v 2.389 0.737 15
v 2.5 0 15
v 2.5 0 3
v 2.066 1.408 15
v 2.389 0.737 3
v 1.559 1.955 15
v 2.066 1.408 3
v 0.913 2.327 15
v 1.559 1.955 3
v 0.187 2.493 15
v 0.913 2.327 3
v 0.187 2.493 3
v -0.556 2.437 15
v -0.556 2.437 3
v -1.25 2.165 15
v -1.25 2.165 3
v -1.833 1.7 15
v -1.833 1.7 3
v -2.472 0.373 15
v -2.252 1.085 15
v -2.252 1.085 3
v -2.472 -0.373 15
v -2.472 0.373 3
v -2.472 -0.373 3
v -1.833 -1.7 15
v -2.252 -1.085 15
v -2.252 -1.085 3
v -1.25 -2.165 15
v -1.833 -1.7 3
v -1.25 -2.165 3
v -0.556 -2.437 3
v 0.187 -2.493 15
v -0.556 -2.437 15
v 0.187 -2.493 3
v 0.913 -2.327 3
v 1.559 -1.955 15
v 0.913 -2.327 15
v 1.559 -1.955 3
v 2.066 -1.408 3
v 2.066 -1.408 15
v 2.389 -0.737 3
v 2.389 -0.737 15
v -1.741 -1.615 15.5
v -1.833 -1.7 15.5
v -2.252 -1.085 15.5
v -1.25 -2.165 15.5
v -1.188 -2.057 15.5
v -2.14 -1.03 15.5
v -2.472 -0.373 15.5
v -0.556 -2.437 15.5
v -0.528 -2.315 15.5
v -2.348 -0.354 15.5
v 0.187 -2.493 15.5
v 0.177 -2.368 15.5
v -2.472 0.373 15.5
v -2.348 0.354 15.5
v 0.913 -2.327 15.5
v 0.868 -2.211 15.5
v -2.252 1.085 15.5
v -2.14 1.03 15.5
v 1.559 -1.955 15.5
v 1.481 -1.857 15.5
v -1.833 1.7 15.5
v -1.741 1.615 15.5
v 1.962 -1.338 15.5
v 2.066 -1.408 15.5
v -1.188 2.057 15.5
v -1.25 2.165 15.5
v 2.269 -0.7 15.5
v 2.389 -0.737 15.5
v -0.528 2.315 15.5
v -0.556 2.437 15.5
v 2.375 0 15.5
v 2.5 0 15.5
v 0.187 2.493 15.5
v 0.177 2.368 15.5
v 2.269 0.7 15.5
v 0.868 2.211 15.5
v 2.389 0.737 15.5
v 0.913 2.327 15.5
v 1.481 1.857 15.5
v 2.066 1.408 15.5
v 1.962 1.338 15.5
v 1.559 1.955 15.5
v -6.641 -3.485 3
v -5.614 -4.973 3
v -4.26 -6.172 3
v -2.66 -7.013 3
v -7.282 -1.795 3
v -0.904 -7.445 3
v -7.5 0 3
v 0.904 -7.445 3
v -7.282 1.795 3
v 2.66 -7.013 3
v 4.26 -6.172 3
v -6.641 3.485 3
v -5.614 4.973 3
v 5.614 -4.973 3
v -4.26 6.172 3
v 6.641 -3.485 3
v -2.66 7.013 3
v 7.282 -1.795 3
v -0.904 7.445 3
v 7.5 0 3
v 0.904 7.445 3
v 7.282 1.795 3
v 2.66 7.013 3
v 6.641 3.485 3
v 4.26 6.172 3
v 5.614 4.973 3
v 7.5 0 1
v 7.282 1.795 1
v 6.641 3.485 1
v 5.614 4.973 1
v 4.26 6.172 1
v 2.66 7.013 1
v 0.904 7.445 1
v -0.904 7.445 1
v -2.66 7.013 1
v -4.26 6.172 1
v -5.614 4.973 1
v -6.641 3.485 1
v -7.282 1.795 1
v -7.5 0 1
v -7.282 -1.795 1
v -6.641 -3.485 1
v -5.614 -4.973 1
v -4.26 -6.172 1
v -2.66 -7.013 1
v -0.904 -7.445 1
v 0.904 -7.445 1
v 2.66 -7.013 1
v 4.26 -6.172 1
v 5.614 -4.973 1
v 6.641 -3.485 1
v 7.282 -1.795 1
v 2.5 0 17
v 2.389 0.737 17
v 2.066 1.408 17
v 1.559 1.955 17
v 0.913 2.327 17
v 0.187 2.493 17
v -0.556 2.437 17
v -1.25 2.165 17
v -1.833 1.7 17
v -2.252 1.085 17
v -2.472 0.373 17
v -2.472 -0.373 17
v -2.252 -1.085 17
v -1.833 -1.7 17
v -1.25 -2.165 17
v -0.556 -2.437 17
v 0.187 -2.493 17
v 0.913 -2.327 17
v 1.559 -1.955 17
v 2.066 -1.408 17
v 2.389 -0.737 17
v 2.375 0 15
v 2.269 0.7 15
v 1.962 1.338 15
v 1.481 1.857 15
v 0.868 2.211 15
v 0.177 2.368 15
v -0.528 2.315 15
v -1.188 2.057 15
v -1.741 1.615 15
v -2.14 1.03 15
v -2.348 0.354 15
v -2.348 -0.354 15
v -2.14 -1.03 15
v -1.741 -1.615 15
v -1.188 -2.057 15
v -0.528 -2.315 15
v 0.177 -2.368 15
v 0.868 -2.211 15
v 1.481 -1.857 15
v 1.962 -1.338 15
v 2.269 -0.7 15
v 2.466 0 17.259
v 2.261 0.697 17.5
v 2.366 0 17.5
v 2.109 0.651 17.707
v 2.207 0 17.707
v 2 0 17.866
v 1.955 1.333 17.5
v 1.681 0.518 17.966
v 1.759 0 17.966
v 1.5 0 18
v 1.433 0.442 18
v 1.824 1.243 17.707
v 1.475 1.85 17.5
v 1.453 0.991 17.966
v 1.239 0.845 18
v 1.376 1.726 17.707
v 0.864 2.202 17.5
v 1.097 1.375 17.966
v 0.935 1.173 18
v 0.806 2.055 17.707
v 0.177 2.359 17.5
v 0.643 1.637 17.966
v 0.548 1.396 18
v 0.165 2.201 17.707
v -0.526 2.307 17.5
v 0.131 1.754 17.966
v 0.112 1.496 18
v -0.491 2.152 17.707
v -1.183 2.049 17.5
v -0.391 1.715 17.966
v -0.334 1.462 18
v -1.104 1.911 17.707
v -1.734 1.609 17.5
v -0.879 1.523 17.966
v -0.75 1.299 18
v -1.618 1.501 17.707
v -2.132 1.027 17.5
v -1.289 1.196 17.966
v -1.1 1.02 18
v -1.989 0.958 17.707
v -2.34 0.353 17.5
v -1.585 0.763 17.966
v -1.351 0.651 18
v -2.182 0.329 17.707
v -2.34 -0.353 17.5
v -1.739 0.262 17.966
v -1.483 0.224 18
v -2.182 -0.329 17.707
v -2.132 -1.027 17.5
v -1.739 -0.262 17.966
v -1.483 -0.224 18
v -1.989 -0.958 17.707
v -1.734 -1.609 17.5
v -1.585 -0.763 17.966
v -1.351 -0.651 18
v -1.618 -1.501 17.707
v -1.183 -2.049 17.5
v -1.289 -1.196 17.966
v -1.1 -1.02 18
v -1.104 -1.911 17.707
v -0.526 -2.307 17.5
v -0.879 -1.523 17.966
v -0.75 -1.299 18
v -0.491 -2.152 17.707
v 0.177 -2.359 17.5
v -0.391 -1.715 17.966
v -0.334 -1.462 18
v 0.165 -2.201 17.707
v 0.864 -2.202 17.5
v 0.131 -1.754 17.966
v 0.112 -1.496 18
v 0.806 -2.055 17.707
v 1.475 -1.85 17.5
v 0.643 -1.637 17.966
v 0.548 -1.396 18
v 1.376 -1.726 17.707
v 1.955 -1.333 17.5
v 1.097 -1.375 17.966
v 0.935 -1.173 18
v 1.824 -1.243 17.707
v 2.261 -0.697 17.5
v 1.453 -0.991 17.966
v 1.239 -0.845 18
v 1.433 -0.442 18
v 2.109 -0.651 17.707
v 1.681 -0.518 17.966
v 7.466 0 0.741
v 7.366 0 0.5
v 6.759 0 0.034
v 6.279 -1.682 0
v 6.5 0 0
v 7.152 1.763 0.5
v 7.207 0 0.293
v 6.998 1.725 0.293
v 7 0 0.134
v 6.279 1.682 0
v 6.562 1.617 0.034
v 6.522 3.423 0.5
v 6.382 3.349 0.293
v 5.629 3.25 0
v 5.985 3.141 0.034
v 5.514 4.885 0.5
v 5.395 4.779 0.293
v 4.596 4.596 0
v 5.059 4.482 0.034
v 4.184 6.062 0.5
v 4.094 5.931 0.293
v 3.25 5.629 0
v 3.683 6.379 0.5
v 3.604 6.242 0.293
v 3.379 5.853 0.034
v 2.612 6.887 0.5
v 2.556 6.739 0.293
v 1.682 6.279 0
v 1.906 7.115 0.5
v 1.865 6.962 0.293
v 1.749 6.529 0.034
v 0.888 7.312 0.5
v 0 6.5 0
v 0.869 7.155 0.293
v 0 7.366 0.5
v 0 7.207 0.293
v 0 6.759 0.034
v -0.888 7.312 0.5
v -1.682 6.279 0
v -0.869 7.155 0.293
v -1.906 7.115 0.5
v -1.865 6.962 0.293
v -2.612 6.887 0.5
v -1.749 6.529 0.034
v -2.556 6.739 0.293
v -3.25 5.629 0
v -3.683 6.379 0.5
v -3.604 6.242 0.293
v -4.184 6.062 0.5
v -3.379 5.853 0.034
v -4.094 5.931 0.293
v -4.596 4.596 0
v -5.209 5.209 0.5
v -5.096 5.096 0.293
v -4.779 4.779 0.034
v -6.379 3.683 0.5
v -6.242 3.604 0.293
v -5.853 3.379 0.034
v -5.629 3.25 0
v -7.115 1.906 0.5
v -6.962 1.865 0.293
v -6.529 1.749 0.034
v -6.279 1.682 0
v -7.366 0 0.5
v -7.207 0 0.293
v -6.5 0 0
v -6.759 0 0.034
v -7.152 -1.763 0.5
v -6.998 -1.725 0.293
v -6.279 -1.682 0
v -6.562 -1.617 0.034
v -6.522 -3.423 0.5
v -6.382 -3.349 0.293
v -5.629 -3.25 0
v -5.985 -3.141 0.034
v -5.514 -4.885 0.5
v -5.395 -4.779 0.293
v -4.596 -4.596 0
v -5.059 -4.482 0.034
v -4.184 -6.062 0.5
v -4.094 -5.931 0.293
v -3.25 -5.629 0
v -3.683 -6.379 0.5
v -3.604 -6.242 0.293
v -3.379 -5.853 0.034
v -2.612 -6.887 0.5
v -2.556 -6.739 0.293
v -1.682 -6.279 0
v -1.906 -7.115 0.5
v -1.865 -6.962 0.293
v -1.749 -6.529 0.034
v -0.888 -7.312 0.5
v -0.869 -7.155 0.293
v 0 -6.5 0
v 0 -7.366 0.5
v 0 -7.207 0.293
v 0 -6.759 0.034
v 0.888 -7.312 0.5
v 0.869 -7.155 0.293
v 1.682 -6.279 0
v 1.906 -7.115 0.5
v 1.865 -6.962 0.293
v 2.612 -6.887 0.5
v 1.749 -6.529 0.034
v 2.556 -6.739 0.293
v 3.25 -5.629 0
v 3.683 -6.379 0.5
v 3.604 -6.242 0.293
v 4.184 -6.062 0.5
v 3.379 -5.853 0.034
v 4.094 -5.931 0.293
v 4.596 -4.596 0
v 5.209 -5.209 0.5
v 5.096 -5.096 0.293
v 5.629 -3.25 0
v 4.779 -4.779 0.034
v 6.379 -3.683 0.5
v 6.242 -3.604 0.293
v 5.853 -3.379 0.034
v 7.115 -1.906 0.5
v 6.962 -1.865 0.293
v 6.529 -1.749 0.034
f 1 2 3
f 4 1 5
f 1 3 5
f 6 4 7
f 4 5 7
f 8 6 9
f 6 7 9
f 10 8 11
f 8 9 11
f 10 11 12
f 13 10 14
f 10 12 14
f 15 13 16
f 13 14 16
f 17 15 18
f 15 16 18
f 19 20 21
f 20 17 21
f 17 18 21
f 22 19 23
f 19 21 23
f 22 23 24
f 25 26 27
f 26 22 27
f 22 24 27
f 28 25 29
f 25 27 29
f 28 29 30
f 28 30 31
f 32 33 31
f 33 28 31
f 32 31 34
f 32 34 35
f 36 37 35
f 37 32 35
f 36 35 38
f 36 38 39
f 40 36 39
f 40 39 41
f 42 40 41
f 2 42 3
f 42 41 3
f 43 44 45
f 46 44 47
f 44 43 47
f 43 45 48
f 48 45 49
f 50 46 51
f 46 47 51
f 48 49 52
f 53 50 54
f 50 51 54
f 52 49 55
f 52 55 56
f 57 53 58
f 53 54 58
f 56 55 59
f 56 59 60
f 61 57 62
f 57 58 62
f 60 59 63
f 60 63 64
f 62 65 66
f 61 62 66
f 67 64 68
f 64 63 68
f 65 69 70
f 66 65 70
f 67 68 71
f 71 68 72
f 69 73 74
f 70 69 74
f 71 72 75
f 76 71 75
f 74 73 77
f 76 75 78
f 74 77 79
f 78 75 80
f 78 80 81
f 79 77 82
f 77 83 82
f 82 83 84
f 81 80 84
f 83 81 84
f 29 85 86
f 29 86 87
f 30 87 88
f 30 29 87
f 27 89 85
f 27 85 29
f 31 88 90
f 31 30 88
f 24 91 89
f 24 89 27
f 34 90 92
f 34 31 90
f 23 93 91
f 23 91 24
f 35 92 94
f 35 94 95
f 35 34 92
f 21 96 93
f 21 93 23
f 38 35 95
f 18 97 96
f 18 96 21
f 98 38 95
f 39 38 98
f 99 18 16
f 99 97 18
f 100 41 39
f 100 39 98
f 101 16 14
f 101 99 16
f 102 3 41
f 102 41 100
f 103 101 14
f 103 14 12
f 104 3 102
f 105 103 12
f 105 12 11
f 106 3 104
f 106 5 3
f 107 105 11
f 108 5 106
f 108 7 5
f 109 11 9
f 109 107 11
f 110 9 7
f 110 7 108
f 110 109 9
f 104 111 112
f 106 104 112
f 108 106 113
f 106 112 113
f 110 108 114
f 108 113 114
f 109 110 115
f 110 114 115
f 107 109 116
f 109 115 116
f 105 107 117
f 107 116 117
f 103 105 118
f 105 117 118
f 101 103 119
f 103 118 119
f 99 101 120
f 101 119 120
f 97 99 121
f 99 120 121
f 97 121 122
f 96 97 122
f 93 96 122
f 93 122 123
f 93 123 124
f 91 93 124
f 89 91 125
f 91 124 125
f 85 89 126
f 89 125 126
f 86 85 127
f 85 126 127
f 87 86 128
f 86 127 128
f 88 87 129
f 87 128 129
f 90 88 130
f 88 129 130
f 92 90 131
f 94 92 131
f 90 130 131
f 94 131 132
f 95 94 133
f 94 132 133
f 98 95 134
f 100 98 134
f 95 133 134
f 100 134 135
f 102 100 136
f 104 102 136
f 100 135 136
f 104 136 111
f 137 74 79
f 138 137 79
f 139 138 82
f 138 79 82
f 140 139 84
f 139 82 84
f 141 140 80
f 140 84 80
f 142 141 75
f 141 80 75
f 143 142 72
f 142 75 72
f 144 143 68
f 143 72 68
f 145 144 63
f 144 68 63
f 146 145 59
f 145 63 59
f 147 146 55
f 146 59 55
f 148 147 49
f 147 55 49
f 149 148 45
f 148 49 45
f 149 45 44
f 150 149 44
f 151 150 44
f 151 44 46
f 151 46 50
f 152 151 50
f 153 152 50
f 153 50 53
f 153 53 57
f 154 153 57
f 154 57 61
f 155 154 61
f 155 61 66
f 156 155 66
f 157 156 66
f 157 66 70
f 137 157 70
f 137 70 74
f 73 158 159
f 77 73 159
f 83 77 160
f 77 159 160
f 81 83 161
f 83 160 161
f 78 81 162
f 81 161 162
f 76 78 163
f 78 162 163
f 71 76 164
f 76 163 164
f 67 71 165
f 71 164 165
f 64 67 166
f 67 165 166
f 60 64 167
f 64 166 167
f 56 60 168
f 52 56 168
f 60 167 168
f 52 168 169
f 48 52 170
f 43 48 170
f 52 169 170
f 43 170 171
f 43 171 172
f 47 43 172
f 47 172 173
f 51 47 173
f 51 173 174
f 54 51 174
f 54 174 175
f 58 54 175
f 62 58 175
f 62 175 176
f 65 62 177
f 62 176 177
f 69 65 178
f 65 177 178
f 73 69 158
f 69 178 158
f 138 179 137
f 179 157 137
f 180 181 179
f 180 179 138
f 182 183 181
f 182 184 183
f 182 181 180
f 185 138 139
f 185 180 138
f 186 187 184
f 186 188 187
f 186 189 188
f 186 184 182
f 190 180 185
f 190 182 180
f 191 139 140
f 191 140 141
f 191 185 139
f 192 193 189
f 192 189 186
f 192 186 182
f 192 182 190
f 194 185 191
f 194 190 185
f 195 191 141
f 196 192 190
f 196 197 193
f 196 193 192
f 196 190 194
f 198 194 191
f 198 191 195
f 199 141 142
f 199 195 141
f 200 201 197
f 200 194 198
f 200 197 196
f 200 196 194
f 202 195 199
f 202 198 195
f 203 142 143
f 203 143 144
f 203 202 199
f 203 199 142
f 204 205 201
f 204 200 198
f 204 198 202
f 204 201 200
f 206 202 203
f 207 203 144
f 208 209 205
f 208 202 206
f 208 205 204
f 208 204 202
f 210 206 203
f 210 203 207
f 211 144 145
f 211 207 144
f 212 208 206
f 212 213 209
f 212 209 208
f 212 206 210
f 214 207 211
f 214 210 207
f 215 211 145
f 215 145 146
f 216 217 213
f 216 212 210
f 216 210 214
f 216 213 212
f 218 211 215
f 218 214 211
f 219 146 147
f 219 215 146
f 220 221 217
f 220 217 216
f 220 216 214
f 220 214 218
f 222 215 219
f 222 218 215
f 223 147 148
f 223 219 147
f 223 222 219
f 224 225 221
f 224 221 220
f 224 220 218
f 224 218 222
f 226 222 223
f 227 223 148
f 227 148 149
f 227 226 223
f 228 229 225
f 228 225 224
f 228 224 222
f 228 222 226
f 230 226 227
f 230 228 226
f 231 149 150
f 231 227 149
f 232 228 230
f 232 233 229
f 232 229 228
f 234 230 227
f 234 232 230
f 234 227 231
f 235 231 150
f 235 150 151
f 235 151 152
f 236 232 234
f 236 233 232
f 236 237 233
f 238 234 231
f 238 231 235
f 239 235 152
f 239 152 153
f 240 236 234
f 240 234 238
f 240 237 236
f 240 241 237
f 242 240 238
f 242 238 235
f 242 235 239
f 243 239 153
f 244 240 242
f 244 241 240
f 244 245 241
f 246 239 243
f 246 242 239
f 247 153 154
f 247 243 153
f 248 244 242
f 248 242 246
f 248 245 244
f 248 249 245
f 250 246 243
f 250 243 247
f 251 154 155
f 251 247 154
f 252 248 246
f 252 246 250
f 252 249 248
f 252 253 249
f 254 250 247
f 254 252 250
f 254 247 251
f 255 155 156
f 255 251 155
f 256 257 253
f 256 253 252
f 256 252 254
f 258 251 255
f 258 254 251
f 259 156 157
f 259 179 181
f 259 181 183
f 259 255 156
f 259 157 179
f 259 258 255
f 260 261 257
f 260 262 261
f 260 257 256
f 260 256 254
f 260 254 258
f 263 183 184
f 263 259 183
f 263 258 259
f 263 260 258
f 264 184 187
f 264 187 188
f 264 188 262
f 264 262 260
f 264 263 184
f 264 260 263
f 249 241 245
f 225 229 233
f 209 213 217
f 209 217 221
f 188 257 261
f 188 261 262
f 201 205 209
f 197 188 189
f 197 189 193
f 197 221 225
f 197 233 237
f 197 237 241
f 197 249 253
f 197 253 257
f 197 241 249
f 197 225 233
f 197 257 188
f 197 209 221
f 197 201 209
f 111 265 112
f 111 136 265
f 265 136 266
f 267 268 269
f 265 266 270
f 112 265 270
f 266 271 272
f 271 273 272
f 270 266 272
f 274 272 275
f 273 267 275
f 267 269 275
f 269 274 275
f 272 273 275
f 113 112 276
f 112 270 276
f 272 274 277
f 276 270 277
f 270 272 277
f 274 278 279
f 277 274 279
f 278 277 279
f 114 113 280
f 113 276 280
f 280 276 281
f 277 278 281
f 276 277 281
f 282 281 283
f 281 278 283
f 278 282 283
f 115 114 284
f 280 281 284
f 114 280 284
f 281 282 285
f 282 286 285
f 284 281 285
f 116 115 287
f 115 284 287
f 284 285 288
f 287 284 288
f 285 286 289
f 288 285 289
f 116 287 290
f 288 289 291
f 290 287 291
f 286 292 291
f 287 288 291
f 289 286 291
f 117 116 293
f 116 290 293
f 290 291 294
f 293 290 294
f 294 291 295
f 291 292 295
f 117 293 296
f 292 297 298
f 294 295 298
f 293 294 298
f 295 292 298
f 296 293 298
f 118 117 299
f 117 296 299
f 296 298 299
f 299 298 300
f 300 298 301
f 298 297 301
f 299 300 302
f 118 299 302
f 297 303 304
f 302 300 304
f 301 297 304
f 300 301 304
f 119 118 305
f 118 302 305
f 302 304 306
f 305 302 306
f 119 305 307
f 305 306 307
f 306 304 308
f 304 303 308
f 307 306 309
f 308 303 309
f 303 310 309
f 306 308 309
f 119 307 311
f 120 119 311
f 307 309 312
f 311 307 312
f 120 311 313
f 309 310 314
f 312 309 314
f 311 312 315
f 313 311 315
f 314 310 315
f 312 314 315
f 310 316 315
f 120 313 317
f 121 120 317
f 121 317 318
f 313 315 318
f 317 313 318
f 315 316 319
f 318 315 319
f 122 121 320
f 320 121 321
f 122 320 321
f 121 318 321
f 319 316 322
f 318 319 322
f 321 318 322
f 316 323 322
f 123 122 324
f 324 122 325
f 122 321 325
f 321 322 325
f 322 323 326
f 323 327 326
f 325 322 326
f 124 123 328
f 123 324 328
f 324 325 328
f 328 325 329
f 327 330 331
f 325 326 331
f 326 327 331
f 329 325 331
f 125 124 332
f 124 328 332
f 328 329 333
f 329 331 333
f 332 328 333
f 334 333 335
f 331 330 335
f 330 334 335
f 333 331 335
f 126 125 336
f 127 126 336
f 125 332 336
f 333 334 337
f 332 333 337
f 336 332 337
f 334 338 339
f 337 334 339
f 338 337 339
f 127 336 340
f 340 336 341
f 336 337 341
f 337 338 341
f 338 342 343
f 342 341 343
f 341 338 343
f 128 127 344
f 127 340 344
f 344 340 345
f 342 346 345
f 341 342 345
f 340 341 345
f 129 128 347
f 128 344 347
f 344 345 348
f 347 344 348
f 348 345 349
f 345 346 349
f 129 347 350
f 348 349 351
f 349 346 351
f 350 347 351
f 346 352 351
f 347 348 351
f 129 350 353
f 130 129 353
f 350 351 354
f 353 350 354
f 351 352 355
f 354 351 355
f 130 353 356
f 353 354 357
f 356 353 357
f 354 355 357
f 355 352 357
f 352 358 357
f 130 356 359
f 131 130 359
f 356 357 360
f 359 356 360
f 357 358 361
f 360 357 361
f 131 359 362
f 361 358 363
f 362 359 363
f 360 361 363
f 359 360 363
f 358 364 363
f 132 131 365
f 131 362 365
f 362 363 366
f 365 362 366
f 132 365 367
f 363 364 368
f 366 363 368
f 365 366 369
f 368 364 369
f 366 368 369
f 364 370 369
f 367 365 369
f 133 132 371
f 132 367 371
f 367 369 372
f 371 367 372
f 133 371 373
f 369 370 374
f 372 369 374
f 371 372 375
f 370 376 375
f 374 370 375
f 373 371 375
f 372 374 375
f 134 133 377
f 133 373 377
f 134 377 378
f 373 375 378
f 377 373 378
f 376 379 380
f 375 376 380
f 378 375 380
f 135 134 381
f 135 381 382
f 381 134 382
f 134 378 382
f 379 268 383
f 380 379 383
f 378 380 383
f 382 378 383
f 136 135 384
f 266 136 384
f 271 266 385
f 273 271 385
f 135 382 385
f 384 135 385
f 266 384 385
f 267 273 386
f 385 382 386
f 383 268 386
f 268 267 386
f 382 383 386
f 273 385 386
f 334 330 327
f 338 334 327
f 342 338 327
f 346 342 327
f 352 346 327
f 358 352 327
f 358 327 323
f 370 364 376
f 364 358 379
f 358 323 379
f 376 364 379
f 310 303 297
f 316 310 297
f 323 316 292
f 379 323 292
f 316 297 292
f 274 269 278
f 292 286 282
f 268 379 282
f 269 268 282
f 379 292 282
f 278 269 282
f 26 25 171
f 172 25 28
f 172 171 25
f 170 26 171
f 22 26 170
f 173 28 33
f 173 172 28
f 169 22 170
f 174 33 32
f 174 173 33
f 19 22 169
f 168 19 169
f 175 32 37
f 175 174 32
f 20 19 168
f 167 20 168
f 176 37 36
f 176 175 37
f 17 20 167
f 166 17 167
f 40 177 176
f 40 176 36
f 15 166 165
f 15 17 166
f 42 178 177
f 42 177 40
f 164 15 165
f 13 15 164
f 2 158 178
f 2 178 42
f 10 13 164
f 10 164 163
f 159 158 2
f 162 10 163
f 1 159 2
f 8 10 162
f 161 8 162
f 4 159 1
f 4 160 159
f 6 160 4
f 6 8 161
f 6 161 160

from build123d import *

# Parameters (mm, degrees)
SKETCH1_R               = 7.5
BOSS_EXTRUDE1_DEPTH     = 3
SKETCH3_R               = 2.5
BOSS_EXTRUDE3_DEPTH     = 15
FILLET1_R               = 1
SKETCH4_R               = 12.375
SKETCH4_R_2             = 2.375
CUT_EXTRUDE_THIN1_DEPTH = 0.5


with BuildPart() as part:
    # Sketch1 → Boss-Extrude1 (new body)
    with BuildSketch(Plane.XY):
        Circle(SKETCH1_R)
    extrude(amount=BOSS_EXTRUDE1_DEPTH)

    # Sketch3 → Boss-Extrude3 (add)
    with BuildSketch(Plane.XY.offset(3)):
        Circle(SKETCH3_R)
    extrude(amount=BOSS_EXTRUDE3_DEPTH)

    # Fillet1
    fillet1_edges = [part.edges().sort_by_distance(p)[0] for p in [
        (-7.5, 0, 0),
        (-2.5, 0, 18),
    ]]
    fillet(fillet1_edges, radius=FILLET1_R)

    # Sketch4 → Cut-Extrude-Thin1 (cut)
    with BuildSketch(Plane.XY.offset(15)):
        Circle(SKETCH4_R)
        Circle(SKETCH4_R_2, mode=Mode.SUBTRACT)
    extrude(amount=CUT_EXTRUDE_THIN1_DEPTH, mode=Mode.SUBTRACT)


solid = part.part
